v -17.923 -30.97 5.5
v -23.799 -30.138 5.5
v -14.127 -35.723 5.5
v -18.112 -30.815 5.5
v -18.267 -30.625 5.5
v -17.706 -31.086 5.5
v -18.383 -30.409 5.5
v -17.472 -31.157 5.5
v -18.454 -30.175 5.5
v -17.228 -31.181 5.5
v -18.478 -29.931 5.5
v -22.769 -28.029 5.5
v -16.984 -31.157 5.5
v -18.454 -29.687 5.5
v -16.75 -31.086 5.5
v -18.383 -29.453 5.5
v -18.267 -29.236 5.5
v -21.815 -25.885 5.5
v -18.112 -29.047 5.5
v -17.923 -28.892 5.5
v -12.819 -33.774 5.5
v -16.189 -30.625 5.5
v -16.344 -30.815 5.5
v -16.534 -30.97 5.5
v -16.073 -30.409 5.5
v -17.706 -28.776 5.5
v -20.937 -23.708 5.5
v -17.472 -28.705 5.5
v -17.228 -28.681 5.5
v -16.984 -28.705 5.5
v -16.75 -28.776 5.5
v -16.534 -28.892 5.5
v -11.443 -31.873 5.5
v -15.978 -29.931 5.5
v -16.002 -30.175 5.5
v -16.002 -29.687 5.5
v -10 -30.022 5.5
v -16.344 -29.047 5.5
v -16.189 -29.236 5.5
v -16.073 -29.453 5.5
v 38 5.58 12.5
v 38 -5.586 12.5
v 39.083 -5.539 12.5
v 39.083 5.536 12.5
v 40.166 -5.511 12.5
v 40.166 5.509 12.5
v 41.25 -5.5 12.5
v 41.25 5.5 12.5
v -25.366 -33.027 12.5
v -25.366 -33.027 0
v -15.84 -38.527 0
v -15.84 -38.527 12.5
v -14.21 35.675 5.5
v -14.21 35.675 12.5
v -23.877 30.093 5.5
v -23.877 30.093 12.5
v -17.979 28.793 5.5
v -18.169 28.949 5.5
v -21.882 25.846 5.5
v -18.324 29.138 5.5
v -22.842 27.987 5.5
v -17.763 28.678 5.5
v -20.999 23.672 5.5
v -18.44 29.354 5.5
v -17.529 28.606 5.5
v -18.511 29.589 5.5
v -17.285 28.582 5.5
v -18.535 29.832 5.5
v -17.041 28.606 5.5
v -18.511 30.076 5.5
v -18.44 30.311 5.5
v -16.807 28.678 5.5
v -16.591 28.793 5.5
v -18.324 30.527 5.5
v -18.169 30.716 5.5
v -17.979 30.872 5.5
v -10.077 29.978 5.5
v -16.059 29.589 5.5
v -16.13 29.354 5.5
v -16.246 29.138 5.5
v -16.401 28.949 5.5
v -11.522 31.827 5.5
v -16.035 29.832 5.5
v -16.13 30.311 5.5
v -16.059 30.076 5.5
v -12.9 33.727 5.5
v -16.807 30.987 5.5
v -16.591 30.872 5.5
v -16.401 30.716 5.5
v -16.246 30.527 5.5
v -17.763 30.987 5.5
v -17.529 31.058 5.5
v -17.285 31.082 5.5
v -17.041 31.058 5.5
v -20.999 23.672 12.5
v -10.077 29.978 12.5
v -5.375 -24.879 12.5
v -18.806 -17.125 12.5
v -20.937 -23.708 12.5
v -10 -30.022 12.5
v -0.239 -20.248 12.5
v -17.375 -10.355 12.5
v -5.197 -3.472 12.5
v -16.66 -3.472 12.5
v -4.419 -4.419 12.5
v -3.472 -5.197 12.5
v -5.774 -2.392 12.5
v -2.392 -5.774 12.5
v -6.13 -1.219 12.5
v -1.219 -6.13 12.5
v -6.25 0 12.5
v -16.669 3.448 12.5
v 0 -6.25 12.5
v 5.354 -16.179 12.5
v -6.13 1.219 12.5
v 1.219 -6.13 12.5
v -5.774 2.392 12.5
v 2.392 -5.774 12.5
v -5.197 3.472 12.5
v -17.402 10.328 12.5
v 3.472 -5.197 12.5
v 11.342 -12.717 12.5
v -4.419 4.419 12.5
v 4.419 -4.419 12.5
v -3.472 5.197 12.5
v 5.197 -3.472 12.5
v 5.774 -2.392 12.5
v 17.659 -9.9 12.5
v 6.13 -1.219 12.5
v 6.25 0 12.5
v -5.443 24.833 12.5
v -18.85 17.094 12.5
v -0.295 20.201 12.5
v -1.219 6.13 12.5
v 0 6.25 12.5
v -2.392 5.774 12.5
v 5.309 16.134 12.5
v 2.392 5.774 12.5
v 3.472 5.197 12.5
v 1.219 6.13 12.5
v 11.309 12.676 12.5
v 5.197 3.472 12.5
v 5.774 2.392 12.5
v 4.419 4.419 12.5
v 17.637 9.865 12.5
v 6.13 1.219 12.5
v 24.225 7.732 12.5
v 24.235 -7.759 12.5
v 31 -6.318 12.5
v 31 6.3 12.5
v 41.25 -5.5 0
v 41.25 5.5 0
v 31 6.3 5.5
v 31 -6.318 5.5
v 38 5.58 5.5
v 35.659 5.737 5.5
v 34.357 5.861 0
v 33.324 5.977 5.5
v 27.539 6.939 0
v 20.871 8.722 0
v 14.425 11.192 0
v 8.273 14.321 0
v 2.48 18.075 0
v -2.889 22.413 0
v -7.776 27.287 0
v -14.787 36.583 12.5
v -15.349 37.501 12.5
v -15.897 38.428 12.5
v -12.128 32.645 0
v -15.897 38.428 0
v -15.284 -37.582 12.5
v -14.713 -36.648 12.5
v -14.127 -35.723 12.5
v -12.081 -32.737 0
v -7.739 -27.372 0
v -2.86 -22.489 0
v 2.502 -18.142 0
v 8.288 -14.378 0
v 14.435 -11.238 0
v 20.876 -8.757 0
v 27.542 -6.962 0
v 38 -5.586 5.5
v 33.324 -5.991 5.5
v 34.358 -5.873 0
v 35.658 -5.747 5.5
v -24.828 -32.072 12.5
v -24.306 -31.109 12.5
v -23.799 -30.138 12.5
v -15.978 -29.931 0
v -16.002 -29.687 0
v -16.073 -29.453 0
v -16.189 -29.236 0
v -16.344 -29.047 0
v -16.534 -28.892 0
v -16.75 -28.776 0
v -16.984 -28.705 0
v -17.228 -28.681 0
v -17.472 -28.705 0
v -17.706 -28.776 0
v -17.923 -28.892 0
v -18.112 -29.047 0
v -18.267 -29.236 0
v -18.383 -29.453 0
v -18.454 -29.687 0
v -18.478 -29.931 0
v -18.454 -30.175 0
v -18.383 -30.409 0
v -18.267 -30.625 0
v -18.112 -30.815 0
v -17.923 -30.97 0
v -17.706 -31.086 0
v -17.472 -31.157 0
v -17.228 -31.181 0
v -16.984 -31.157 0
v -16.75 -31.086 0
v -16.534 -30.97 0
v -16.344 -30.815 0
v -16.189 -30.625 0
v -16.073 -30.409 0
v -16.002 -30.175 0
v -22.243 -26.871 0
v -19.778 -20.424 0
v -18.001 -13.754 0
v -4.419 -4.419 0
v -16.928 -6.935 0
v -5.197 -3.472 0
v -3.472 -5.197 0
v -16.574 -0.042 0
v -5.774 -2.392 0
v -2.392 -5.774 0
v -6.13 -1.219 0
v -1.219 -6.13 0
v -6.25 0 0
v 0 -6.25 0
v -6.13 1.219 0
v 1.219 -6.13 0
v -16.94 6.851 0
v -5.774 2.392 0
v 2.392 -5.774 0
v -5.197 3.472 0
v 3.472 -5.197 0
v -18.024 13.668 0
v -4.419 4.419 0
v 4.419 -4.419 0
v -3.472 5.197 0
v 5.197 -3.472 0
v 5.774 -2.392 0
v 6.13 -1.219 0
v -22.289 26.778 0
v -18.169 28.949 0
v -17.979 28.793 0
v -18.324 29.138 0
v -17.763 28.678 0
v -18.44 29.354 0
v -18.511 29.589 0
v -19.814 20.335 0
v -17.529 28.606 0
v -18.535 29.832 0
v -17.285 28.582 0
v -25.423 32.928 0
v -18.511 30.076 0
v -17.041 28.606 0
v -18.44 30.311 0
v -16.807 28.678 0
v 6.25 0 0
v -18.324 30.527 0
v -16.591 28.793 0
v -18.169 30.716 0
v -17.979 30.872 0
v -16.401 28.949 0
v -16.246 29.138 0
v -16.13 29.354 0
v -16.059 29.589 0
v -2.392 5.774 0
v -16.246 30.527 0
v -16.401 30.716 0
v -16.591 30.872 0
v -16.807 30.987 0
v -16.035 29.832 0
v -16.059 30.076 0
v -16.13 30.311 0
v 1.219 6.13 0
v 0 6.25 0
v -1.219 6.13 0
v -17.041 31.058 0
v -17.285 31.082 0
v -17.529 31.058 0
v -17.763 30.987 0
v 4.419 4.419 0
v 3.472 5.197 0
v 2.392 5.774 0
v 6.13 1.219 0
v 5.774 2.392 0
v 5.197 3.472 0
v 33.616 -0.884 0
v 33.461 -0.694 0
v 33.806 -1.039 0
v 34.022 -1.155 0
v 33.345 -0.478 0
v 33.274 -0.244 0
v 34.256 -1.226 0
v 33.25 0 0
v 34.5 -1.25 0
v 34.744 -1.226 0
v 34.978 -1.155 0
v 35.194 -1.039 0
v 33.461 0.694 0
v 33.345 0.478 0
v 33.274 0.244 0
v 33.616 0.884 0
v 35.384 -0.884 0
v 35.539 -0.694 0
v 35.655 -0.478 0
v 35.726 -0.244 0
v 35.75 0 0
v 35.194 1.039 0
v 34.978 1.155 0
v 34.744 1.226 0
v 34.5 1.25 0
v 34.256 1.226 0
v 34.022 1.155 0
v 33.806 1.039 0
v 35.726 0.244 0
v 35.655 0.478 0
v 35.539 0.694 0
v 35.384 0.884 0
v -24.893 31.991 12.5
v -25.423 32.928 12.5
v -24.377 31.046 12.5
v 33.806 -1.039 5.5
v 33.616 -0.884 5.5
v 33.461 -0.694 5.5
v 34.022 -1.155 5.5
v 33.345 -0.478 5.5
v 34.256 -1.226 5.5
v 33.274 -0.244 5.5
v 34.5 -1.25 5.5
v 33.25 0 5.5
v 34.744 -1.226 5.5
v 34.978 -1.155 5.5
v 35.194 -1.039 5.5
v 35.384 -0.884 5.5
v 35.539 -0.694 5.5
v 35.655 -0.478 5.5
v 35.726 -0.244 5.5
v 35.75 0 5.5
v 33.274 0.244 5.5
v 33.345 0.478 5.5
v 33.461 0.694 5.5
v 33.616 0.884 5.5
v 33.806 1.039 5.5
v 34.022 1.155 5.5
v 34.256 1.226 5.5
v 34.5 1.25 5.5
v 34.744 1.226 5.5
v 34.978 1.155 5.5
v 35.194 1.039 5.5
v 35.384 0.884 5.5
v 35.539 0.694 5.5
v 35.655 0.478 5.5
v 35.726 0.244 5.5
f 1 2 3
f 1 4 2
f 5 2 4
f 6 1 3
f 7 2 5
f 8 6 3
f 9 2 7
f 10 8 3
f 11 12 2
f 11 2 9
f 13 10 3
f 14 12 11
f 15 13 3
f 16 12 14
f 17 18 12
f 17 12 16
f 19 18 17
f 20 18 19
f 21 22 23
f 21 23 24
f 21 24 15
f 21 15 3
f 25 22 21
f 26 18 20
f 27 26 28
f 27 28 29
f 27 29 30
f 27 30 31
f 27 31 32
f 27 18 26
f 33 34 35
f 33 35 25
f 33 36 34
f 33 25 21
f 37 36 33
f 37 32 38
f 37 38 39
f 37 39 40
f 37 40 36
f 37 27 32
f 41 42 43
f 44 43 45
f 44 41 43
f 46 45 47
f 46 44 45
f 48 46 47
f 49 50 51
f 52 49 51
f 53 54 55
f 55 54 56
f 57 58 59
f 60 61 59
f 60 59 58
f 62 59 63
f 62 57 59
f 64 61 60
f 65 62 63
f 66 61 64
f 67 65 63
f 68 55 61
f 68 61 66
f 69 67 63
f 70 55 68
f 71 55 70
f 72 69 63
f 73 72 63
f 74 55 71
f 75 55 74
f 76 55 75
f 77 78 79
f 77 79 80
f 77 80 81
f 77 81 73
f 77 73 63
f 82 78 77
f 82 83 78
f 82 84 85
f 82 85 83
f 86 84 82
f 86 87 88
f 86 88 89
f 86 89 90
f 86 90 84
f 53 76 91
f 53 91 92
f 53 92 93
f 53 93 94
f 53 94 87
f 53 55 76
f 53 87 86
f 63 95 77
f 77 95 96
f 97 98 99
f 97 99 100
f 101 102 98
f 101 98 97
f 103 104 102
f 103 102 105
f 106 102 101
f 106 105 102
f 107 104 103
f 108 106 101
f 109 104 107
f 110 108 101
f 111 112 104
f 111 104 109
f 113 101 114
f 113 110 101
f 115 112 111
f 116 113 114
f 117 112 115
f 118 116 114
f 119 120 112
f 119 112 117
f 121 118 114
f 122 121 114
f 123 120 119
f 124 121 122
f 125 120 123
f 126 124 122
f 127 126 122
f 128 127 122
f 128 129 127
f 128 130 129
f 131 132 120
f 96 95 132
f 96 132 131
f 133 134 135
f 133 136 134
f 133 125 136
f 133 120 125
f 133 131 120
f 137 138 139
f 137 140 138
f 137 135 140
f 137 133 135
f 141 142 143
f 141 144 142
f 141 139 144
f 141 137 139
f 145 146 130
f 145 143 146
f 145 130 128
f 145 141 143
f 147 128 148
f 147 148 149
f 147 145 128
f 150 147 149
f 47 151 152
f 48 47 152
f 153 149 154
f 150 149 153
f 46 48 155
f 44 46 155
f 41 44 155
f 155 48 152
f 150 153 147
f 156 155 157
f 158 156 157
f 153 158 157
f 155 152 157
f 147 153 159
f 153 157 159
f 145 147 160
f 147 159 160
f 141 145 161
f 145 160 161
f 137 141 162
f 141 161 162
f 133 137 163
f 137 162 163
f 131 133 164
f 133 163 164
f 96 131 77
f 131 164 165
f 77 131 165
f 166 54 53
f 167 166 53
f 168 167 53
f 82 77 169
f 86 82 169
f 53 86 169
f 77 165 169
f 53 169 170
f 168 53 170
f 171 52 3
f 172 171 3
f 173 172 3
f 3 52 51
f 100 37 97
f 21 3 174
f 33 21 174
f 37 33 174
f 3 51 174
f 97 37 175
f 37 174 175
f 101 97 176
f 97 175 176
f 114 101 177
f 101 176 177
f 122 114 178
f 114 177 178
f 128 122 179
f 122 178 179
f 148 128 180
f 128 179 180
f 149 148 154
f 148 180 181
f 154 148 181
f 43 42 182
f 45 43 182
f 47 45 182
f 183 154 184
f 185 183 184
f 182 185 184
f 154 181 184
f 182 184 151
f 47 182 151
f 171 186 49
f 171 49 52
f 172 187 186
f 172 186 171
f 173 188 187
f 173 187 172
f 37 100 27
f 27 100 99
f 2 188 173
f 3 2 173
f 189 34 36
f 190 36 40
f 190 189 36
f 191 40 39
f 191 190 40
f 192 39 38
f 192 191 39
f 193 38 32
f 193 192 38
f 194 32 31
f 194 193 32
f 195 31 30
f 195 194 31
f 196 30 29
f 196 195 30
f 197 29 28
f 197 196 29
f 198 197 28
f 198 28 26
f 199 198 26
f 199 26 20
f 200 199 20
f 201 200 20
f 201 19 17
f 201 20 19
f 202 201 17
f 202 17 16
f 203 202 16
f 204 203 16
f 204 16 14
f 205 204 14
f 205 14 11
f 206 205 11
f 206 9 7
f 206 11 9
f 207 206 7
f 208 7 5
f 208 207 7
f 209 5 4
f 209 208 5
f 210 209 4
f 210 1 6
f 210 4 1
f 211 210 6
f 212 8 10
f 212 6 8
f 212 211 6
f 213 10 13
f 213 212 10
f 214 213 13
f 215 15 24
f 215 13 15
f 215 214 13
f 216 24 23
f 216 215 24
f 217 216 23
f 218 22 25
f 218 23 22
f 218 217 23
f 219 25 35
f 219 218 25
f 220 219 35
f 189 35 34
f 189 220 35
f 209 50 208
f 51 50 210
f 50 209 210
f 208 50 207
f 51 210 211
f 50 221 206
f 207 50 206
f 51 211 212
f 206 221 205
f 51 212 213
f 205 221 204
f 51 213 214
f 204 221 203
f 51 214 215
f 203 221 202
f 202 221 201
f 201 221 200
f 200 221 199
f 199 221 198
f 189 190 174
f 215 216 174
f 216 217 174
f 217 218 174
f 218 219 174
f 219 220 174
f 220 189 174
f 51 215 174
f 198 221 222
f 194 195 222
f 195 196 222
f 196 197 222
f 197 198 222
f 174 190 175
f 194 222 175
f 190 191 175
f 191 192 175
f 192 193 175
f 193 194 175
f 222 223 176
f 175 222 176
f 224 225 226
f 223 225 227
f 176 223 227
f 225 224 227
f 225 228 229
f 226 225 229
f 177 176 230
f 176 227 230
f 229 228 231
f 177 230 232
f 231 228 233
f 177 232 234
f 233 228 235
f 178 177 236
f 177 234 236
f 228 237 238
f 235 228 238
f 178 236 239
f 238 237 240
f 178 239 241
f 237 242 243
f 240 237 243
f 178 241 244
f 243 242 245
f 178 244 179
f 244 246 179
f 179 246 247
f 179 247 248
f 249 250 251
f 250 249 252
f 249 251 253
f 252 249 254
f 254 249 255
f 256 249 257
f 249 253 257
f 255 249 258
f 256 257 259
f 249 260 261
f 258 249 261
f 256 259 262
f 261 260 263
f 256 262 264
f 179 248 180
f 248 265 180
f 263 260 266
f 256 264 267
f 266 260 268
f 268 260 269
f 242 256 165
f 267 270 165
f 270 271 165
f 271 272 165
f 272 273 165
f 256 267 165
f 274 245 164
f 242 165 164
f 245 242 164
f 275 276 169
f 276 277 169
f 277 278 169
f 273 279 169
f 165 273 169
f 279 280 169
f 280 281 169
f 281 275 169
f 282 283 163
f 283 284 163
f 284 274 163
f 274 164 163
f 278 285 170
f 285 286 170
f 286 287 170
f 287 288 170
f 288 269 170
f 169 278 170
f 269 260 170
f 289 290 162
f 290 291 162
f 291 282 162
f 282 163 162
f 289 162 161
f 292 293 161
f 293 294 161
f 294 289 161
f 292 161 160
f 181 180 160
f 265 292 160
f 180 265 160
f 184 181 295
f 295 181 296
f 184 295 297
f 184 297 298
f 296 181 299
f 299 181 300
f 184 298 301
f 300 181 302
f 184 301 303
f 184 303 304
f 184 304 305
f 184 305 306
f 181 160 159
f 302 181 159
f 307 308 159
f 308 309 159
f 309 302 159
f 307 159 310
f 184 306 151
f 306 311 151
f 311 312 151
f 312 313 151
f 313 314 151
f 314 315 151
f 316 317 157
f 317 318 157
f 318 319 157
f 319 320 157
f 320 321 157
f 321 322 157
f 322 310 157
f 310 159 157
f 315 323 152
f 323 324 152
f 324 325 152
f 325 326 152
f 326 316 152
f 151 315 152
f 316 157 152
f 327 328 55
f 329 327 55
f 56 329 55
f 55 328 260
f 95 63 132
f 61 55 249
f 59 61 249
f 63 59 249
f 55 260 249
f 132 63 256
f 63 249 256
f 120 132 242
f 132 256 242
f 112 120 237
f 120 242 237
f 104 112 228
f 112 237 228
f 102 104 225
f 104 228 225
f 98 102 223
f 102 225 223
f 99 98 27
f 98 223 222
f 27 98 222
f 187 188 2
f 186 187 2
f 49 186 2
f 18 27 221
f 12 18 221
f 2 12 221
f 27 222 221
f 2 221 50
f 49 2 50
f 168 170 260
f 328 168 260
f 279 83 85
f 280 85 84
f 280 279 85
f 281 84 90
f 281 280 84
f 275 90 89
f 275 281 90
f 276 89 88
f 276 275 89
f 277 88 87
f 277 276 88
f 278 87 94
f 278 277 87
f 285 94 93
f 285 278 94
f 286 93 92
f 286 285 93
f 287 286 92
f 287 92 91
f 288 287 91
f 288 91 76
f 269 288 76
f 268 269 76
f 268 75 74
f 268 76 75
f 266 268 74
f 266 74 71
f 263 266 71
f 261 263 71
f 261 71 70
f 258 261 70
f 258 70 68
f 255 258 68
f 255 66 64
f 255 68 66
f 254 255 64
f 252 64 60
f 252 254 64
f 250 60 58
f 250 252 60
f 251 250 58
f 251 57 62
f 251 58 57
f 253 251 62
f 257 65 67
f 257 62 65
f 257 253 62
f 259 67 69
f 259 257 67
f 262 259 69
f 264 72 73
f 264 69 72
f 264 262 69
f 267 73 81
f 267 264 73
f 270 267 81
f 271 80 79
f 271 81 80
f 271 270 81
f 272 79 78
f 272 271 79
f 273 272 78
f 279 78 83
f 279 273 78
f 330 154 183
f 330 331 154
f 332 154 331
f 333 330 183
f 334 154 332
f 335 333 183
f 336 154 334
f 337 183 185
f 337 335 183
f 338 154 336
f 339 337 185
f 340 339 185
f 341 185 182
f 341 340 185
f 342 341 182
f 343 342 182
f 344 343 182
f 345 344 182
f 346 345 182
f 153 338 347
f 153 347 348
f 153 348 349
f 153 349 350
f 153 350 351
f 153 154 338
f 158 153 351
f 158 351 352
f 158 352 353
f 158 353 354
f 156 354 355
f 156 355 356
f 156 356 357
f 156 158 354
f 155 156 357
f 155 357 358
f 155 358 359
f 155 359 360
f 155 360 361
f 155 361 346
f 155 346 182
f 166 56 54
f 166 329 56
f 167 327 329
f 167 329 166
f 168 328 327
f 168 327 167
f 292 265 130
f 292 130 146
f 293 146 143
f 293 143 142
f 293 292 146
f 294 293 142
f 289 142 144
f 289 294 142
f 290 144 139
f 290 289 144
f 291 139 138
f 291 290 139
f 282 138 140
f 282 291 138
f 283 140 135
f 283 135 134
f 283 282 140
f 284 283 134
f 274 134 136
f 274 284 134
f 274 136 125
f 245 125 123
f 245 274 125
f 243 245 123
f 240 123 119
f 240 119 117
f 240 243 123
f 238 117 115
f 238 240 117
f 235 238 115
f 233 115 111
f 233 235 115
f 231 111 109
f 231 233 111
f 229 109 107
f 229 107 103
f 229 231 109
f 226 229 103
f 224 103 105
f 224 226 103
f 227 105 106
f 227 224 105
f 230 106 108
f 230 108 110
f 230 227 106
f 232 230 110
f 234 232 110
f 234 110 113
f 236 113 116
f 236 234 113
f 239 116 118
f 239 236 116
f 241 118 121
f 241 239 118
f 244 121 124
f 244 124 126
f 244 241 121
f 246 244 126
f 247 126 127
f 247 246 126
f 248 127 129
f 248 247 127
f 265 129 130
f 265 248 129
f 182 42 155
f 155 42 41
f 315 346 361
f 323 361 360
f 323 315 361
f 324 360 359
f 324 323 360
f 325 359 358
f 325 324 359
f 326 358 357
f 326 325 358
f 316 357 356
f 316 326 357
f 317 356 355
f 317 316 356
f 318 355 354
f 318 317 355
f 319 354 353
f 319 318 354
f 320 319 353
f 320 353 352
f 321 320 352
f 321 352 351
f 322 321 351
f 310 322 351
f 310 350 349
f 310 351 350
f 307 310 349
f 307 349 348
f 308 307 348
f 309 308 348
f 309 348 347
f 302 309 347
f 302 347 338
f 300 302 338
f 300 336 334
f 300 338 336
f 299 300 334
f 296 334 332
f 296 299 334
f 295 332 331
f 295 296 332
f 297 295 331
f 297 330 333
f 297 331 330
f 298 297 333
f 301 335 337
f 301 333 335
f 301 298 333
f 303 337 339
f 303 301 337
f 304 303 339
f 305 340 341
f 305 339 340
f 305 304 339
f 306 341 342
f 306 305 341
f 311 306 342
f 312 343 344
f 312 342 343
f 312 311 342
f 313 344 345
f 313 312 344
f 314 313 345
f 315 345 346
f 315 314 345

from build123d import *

# Parameters (mm, degrees)
CROQUIS1_R              = 6.25
CROQUIS1_R_2            = 1.25
SALIENTE_EXTRUIR1_DEPTH = 12.5
CROQUIS2_W              = 7
CROQUIS2_H              = 18.683696708
CORTAR_EXTRUIR1_DEPTH   = 7


with BuildPart() as part:
    # Croquis1 → Saliente-Extruir1 (new body)
    with BuildSketch(Plane.XY):
        with BuildLine():
            Line((41.25, -5.5), (41.25, 5.5))
            ThreePointArc((41.25, 5.5), (8.272659528, 14.321014207), (-15.896844885, 38.428074017))
            Line((-15.896844885, 38.428074017), (-25.423124326, 32.928074017))
            ThreePointArc((-25.423124326, 32.928074017), (-16.573676481, -0.041647684), (-25.36625048, -33.026582408))
            Line((-25.36625048, -33.026582408), (-15.839971039, -38.526582408))
            ThreePointArc((-15.839971039, -38.526582408), (8.287921588, -14.377874913), (41.25, -5.5))
        make_face()
        Circle(CROQUIS1_R, mode=Mode.SUBTRACT)
        with Locations((34.5, 0)):
            Circle(CROQUIS1_R_2, mode=Mode.SUBTRACT)
        with Locations((-17.22811076, -29.930910932)):
            Circle(CROQUIS1_R_2, mode=Mode.SUBTRACT)
        with Locations((-17.284984605, 29.832402542)):
            Circle(CROQUIS1_R_2, mode=Mode.SUBTRACT)
    extrude(amount=SALIENTE_EXTRUIR1_DEPTH)

    # Croquis2 → Cortar-Extruir1 (cut)
    with BuildSketch(Plane.XY.offset(12.5)):
        with Locations((34.5, -0.520271759)):
            Rectangle(CROQUIS2_W, CROQUIS2_H)
        Polygon((-11.360290568, -37.319753641), (-7.860290568, -31.257575815), (-24.040846553, -21.915727461), (-27.540846553, -27.977905287), align=None)
        Polygon((-26.639709432, 28.498177047), (-23.139709432, 22.43599922), (-6.959153447, 31.777847574), (-10.459153447, 37.8400254), align=None)
    extrude(amount=-CORTAR_EXTRUIR1_DEPTH, mode=Mode.SUBTRACT)


solid = part.part
